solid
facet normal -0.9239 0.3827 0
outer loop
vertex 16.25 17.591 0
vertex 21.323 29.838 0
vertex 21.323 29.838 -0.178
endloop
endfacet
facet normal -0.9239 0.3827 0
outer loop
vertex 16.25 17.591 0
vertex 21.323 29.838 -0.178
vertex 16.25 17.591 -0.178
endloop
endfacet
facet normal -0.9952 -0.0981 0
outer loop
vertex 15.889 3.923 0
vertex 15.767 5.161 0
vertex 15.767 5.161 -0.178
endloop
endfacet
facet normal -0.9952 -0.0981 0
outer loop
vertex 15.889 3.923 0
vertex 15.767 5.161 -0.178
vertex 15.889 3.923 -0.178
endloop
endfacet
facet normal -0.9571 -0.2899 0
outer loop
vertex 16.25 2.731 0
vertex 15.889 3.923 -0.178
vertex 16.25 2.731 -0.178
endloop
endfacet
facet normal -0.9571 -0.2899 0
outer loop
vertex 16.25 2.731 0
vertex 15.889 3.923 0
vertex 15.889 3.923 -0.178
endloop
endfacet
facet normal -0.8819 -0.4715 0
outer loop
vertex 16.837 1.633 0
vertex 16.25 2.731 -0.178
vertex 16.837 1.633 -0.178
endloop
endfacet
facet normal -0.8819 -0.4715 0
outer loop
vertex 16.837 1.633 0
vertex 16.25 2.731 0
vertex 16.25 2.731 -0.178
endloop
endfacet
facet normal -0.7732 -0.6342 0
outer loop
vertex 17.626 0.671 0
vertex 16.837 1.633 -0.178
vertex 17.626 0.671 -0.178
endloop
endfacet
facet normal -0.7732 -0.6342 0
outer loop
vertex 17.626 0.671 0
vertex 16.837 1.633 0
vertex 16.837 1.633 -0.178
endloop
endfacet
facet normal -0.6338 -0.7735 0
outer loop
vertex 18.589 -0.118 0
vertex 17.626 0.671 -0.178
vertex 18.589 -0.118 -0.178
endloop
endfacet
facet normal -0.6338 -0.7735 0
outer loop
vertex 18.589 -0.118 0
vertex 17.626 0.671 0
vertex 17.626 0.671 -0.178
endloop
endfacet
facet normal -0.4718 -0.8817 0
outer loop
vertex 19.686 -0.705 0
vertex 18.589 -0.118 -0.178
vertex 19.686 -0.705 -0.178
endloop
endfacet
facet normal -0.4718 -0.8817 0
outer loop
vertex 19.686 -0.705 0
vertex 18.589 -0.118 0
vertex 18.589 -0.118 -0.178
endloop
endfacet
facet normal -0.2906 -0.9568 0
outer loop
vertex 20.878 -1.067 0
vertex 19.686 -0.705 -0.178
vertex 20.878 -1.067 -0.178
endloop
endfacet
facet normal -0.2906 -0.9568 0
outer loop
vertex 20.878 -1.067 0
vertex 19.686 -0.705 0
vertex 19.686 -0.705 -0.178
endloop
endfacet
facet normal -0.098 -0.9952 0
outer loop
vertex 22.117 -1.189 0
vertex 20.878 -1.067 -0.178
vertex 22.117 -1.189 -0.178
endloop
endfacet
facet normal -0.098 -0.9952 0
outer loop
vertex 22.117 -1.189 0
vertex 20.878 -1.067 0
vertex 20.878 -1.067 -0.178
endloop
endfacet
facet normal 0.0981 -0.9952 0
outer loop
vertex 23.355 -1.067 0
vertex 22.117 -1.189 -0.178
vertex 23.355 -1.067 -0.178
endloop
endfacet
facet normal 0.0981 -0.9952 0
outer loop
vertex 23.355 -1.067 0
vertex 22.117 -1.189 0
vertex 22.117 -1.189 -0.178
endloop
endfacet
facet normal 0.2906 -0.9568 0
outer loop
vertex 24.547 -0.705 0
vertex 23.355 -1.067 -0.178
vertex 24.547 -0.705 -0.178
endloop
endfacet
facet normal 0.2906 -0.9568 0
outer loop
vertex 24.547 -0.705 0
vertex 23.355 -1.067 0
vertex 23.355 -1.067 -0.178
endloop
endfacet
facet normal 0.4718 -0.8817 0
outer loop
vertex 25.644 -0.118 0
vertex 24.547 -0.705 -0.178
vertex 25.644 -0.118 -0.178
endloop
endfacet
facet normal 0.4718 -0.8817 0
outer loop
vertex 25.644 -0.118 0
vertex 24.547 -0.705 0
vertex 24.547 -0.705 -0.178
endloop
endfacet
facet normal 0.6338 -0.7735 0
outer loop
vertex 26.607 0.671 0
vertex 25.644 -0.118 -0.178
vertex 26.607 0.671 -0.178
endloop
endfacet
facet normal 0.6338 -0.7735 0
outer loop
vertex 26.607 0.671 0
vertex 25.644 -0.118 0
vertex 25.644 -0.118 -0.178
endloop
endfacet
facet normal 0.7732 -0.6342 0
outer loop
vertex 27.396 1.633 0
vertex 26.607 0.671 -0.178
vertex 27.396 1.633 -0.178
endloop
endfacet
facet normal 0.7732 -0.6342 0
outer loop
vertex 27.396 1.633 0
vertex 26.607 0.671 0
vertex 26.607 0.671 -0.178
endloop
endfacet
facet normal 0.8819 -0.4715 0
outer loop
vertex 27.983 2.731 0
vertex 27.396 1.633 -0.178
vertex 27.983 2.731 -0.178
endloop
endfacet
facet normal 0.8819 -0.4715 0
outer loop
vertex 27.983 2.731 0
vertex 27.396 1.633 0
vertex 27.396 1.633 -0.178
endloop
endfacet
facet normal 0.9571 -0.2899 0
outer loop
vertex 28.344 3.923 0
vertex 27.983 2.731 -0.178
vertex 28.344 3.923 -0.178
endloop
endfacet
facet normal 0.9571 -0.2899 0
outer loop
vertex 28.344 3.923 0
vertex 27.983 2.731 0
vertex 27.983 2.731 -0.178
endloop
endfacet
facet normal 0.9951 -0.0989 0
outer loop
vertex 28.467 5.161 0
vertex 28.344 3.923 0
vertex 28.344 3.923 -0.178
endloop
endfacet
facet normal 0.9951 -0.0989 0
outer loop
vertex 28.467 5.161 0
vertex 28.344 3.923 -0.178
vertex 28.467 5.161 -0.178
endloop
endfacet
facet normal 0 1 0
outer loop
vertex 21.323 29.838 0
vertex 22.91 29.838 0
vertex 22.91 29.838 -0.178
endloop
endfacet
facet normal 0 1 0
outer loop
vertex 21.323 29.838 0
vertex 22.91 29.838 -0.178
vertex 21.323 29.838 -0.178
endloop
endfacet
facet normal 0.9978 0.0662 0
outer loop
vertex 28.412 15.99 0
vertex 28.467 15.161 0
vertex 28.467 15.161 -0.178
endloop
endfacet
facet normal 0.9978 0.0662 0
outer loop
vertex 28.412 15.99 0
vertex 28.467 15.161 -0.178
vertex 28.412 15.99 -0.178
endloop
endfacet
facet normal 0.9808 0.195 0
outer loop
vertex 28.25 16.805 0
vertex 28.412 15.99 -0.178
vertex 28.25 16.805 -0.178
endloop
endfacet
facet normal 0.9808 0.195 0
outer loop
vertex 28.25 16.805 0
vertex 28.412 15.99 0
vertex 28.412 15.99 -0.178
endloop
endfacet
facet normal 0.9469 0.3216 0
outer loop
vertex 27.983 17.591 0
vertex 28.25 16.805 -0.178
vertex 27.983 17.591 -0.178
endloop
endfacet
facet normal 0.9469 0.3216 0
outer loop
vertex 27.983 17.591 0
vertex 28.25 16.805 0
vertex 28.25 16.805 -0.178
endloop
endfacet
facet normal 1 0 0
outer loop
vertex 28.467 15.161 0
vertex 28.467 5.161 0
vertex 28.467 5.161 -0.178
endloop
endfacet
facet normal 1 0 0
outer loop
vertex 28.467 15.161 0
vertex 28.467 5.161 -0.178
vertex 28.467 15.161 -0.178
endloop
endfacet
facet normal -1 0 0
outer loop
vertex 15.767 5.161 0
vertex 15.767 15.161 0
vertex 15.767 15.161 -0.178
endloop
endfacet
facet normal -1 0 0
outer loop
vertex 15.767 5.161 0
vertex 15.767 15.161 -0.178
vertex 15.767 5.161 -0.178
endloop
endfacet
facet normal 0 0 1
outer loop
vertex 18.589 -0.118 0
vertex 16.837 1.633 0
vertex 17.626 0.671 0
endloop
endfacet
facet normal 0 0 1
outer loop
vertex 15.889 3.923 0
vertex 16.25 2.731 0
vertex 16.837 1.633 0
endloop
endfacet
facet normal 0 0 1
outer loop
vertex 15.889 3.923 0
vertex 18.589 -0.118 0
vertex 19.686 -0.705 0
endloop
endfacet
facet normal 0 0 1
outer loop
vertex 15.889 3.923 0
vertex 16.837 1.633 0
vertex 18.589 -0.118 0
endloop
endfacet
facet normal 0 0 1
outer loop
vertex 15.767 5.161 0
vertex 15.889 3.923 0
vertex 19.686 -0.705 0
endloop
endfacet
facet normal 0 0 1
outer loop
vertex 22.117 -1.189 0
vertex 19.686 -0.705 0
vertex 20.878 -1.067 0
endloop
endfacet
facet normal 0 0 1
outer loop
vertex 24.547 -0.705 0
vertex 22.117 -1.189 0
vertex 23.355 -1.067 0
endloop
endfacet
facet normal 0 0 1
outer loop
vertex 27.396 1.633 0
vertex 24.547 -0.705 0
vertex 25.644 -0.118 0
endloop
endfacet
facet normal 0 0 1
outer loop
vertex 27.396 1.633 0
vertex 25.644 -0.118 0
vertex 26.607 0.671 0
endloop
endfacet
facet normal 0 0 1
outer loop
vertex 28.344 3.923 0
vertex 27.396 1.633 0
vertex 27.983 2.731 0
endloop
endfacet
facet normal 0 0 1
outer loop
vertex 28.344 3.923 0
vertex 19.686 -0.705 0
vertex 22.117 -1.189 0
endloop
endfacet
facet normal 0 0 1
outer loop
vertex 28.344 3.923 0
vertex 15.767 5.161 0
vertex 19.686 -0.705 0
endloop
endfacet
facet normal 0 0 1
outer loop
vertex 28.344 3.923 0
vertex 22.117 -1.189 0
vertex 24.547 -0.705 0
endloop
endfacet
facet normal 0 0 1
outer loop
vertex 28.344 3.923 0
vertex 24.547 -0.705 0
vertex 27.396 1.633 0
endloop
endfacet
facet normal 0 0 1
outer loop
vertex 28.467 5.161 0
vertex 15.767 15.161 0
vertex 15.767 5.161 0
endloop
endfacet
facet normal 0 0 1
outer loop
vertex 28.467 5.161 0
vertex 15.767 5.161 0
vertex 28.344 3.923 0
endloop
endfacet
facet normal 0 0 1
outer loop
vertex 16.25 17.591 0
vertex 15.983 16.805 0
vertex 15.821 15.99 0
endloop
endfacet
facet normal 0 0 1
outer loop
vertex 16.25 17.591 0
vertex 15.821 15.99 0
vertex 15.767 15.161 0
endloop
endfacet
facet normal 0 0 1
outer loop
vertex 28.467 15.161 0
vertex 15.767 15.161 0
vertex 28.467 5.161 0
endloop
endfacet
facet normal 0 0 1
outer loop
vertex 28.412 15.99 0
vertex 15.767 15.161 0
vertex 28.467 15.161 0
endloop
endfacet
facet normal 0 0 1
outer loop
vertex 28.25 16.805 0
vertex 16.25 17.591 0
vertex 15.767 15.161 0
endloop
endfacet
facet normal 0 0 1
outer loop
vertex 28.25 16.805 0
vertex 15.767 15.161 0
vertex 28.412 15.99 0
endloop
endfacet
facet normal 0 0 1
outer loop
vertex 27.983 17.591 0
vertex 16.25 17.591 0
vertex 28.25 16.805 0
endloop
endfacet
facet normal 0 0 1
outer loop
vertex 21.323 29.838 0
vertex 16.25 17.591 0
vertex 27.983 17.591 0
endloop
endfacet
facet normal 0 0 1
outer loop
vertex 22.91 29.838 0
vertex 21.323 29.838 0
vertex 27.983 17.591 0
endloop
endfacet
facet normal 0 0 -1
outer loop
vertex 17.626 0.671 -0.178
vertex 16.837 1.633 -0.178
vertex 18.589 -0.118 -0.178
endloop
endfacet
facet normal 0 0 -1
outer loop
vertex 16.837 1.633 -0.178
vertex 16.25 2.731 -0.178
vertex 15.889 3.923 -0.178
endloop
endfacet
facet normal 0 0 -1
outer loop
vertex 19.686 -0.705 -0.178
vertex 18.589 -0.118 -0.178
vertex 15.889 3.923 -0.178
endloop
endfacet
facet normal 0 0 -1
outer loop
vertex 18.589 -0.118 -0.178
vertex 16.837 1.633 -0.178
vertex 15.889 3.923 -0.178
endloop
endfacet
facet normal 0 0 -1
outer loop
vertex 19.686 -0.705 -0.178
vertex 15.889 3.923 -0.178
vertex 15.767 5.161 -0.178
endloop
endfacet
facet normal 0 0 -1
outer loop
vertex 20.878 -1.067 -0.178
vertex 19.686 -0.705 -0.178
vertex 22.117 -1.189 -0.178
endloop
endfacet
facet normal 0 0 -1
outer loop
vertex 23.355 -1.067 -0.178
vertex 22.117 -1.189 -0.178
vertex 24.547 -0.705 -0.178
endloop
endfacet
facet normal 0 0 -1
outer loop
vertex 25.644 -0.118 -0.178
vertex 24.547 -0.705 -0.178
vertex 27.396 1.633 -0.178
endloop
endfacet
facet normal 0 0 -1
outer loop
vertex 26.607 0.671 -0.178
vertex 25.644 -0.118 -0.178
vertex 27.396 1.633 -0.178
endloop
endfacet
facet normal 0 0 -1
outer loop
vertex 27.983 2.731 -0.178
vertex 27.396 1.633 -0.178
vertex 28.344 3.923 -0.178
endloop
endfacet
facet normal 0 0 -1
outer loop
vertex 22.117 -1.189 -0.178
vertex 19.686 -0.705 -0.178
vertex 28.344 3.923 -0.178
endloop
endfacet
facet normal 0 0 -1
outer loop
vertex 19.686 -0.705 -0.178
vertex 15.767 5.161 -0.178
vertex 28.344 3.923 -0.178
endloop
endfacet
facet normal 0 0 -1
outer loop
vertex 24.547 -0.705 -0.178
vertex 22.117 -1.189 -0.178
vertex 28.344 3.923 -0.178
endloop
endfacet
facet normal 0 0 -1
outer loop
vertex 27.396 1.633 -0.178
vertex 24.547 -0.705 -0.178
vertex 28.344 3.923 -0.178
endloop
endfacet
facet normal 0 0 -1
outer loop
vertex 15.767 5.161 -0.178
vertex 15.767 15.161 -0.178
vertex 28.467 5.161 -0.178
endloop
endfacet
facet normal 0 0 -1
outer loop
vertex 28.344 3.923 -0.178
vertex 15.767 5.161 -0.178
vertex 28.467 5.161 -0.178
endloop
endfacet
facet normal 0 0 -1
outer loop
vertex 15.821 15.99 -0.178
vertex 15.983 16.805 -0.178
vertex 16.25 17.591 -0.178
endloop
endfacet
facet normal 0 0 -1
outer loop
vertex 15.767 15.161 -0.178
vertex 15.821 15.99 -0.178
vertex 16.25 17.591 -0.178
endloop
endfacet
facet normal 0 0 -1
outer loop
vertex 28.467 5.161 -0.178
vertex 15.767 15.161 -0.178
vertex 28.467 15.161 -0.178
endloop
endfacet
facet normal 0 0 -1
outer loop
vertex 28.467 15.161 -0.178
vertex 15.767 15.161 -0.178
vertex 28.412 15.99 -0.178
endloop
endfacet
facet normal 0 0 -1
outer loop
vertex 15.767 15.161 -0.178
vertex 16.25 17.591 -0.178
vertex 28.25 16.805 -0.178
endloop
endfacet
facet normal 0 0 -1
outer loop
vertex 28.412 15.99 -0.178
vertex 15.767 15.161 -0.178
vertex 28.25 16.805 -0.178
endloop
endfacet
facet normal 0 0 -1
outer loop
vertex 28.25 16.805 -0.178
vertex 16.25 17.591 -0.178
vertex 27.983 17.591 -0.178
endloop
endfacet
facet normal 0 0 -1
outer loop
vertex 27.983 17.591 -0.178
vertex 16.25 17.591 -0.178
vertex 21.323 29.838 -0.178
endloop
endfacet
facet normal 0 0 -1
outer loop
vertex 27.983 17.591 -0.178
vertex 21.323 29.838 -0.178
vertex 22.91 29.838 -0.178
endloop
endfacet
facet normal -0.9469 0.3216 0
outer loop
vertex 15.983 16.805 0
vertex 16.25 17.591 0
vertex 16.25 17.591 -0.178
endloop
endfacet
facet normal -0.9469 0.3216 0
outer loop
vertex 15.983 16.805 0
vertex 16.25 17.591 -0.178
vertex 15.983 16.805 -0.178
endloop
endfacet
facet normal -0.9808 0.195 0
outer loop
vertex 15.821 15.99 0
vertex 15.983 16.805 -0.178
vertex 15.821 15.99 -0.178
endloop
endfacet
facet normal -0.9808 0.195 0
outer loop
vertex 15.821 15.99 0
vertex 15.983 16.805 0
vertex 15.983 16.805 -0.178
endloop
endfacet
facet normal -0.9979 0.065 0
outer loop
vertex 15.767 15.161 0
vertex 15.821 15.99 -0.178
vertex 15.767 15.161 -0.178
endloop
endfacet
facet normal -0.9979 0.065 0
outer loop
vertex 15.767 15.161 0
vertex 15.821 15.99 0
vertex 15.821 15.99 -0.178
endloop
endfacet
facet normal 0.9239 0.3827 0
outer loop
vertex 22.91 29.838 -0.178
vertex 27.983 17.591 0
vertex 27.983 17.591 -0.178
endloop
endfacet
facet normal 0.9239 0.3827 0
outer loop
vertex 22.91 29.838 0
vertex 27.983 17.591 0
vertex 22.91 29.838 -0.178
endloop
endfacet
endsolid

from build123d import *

# Parameters (mm, degrees)
BOSS_EXTRUDE2_DEPTH = 0.1778


with BuildPart() as part:
    # Sketch1 → Boss-Extrude2 (new body)
    with BuildSketch(Plane.XY):
        with BuildLine():
            Line((28.466511978, 5.161354222), (28.466511978, 15.161354222))
            ThreePointArc((28.466511978, 15.161354222), (28.344498508, 16.400177767), (27.983147009, 17.591394018))
            Line((27.983147009, 17.591394018), (22.910261978, 29.838421861))
            Line((22.910261978, 29.838421861), (21.322761978, 29.838421861))
            Line((21.322761978, 29.838421861), (16.249876946, 17.591394018))
            ThreePointArc((16.249876946, 17.591394018), (15.888525447, 16.400177767), (15.766511978, 15.161354222))
            Line((15.766511978, 15.161354222), (15.766511978, 5.161354222))
            ThreePointArc((15.766511978, 5.161354222), (22.116511978, -1.188645778), (28.466511978, 5.161354222))
        make_face()
    extrude(amount=-BOSS_EXTRUDE2_DEPTH)


solid = part.part
